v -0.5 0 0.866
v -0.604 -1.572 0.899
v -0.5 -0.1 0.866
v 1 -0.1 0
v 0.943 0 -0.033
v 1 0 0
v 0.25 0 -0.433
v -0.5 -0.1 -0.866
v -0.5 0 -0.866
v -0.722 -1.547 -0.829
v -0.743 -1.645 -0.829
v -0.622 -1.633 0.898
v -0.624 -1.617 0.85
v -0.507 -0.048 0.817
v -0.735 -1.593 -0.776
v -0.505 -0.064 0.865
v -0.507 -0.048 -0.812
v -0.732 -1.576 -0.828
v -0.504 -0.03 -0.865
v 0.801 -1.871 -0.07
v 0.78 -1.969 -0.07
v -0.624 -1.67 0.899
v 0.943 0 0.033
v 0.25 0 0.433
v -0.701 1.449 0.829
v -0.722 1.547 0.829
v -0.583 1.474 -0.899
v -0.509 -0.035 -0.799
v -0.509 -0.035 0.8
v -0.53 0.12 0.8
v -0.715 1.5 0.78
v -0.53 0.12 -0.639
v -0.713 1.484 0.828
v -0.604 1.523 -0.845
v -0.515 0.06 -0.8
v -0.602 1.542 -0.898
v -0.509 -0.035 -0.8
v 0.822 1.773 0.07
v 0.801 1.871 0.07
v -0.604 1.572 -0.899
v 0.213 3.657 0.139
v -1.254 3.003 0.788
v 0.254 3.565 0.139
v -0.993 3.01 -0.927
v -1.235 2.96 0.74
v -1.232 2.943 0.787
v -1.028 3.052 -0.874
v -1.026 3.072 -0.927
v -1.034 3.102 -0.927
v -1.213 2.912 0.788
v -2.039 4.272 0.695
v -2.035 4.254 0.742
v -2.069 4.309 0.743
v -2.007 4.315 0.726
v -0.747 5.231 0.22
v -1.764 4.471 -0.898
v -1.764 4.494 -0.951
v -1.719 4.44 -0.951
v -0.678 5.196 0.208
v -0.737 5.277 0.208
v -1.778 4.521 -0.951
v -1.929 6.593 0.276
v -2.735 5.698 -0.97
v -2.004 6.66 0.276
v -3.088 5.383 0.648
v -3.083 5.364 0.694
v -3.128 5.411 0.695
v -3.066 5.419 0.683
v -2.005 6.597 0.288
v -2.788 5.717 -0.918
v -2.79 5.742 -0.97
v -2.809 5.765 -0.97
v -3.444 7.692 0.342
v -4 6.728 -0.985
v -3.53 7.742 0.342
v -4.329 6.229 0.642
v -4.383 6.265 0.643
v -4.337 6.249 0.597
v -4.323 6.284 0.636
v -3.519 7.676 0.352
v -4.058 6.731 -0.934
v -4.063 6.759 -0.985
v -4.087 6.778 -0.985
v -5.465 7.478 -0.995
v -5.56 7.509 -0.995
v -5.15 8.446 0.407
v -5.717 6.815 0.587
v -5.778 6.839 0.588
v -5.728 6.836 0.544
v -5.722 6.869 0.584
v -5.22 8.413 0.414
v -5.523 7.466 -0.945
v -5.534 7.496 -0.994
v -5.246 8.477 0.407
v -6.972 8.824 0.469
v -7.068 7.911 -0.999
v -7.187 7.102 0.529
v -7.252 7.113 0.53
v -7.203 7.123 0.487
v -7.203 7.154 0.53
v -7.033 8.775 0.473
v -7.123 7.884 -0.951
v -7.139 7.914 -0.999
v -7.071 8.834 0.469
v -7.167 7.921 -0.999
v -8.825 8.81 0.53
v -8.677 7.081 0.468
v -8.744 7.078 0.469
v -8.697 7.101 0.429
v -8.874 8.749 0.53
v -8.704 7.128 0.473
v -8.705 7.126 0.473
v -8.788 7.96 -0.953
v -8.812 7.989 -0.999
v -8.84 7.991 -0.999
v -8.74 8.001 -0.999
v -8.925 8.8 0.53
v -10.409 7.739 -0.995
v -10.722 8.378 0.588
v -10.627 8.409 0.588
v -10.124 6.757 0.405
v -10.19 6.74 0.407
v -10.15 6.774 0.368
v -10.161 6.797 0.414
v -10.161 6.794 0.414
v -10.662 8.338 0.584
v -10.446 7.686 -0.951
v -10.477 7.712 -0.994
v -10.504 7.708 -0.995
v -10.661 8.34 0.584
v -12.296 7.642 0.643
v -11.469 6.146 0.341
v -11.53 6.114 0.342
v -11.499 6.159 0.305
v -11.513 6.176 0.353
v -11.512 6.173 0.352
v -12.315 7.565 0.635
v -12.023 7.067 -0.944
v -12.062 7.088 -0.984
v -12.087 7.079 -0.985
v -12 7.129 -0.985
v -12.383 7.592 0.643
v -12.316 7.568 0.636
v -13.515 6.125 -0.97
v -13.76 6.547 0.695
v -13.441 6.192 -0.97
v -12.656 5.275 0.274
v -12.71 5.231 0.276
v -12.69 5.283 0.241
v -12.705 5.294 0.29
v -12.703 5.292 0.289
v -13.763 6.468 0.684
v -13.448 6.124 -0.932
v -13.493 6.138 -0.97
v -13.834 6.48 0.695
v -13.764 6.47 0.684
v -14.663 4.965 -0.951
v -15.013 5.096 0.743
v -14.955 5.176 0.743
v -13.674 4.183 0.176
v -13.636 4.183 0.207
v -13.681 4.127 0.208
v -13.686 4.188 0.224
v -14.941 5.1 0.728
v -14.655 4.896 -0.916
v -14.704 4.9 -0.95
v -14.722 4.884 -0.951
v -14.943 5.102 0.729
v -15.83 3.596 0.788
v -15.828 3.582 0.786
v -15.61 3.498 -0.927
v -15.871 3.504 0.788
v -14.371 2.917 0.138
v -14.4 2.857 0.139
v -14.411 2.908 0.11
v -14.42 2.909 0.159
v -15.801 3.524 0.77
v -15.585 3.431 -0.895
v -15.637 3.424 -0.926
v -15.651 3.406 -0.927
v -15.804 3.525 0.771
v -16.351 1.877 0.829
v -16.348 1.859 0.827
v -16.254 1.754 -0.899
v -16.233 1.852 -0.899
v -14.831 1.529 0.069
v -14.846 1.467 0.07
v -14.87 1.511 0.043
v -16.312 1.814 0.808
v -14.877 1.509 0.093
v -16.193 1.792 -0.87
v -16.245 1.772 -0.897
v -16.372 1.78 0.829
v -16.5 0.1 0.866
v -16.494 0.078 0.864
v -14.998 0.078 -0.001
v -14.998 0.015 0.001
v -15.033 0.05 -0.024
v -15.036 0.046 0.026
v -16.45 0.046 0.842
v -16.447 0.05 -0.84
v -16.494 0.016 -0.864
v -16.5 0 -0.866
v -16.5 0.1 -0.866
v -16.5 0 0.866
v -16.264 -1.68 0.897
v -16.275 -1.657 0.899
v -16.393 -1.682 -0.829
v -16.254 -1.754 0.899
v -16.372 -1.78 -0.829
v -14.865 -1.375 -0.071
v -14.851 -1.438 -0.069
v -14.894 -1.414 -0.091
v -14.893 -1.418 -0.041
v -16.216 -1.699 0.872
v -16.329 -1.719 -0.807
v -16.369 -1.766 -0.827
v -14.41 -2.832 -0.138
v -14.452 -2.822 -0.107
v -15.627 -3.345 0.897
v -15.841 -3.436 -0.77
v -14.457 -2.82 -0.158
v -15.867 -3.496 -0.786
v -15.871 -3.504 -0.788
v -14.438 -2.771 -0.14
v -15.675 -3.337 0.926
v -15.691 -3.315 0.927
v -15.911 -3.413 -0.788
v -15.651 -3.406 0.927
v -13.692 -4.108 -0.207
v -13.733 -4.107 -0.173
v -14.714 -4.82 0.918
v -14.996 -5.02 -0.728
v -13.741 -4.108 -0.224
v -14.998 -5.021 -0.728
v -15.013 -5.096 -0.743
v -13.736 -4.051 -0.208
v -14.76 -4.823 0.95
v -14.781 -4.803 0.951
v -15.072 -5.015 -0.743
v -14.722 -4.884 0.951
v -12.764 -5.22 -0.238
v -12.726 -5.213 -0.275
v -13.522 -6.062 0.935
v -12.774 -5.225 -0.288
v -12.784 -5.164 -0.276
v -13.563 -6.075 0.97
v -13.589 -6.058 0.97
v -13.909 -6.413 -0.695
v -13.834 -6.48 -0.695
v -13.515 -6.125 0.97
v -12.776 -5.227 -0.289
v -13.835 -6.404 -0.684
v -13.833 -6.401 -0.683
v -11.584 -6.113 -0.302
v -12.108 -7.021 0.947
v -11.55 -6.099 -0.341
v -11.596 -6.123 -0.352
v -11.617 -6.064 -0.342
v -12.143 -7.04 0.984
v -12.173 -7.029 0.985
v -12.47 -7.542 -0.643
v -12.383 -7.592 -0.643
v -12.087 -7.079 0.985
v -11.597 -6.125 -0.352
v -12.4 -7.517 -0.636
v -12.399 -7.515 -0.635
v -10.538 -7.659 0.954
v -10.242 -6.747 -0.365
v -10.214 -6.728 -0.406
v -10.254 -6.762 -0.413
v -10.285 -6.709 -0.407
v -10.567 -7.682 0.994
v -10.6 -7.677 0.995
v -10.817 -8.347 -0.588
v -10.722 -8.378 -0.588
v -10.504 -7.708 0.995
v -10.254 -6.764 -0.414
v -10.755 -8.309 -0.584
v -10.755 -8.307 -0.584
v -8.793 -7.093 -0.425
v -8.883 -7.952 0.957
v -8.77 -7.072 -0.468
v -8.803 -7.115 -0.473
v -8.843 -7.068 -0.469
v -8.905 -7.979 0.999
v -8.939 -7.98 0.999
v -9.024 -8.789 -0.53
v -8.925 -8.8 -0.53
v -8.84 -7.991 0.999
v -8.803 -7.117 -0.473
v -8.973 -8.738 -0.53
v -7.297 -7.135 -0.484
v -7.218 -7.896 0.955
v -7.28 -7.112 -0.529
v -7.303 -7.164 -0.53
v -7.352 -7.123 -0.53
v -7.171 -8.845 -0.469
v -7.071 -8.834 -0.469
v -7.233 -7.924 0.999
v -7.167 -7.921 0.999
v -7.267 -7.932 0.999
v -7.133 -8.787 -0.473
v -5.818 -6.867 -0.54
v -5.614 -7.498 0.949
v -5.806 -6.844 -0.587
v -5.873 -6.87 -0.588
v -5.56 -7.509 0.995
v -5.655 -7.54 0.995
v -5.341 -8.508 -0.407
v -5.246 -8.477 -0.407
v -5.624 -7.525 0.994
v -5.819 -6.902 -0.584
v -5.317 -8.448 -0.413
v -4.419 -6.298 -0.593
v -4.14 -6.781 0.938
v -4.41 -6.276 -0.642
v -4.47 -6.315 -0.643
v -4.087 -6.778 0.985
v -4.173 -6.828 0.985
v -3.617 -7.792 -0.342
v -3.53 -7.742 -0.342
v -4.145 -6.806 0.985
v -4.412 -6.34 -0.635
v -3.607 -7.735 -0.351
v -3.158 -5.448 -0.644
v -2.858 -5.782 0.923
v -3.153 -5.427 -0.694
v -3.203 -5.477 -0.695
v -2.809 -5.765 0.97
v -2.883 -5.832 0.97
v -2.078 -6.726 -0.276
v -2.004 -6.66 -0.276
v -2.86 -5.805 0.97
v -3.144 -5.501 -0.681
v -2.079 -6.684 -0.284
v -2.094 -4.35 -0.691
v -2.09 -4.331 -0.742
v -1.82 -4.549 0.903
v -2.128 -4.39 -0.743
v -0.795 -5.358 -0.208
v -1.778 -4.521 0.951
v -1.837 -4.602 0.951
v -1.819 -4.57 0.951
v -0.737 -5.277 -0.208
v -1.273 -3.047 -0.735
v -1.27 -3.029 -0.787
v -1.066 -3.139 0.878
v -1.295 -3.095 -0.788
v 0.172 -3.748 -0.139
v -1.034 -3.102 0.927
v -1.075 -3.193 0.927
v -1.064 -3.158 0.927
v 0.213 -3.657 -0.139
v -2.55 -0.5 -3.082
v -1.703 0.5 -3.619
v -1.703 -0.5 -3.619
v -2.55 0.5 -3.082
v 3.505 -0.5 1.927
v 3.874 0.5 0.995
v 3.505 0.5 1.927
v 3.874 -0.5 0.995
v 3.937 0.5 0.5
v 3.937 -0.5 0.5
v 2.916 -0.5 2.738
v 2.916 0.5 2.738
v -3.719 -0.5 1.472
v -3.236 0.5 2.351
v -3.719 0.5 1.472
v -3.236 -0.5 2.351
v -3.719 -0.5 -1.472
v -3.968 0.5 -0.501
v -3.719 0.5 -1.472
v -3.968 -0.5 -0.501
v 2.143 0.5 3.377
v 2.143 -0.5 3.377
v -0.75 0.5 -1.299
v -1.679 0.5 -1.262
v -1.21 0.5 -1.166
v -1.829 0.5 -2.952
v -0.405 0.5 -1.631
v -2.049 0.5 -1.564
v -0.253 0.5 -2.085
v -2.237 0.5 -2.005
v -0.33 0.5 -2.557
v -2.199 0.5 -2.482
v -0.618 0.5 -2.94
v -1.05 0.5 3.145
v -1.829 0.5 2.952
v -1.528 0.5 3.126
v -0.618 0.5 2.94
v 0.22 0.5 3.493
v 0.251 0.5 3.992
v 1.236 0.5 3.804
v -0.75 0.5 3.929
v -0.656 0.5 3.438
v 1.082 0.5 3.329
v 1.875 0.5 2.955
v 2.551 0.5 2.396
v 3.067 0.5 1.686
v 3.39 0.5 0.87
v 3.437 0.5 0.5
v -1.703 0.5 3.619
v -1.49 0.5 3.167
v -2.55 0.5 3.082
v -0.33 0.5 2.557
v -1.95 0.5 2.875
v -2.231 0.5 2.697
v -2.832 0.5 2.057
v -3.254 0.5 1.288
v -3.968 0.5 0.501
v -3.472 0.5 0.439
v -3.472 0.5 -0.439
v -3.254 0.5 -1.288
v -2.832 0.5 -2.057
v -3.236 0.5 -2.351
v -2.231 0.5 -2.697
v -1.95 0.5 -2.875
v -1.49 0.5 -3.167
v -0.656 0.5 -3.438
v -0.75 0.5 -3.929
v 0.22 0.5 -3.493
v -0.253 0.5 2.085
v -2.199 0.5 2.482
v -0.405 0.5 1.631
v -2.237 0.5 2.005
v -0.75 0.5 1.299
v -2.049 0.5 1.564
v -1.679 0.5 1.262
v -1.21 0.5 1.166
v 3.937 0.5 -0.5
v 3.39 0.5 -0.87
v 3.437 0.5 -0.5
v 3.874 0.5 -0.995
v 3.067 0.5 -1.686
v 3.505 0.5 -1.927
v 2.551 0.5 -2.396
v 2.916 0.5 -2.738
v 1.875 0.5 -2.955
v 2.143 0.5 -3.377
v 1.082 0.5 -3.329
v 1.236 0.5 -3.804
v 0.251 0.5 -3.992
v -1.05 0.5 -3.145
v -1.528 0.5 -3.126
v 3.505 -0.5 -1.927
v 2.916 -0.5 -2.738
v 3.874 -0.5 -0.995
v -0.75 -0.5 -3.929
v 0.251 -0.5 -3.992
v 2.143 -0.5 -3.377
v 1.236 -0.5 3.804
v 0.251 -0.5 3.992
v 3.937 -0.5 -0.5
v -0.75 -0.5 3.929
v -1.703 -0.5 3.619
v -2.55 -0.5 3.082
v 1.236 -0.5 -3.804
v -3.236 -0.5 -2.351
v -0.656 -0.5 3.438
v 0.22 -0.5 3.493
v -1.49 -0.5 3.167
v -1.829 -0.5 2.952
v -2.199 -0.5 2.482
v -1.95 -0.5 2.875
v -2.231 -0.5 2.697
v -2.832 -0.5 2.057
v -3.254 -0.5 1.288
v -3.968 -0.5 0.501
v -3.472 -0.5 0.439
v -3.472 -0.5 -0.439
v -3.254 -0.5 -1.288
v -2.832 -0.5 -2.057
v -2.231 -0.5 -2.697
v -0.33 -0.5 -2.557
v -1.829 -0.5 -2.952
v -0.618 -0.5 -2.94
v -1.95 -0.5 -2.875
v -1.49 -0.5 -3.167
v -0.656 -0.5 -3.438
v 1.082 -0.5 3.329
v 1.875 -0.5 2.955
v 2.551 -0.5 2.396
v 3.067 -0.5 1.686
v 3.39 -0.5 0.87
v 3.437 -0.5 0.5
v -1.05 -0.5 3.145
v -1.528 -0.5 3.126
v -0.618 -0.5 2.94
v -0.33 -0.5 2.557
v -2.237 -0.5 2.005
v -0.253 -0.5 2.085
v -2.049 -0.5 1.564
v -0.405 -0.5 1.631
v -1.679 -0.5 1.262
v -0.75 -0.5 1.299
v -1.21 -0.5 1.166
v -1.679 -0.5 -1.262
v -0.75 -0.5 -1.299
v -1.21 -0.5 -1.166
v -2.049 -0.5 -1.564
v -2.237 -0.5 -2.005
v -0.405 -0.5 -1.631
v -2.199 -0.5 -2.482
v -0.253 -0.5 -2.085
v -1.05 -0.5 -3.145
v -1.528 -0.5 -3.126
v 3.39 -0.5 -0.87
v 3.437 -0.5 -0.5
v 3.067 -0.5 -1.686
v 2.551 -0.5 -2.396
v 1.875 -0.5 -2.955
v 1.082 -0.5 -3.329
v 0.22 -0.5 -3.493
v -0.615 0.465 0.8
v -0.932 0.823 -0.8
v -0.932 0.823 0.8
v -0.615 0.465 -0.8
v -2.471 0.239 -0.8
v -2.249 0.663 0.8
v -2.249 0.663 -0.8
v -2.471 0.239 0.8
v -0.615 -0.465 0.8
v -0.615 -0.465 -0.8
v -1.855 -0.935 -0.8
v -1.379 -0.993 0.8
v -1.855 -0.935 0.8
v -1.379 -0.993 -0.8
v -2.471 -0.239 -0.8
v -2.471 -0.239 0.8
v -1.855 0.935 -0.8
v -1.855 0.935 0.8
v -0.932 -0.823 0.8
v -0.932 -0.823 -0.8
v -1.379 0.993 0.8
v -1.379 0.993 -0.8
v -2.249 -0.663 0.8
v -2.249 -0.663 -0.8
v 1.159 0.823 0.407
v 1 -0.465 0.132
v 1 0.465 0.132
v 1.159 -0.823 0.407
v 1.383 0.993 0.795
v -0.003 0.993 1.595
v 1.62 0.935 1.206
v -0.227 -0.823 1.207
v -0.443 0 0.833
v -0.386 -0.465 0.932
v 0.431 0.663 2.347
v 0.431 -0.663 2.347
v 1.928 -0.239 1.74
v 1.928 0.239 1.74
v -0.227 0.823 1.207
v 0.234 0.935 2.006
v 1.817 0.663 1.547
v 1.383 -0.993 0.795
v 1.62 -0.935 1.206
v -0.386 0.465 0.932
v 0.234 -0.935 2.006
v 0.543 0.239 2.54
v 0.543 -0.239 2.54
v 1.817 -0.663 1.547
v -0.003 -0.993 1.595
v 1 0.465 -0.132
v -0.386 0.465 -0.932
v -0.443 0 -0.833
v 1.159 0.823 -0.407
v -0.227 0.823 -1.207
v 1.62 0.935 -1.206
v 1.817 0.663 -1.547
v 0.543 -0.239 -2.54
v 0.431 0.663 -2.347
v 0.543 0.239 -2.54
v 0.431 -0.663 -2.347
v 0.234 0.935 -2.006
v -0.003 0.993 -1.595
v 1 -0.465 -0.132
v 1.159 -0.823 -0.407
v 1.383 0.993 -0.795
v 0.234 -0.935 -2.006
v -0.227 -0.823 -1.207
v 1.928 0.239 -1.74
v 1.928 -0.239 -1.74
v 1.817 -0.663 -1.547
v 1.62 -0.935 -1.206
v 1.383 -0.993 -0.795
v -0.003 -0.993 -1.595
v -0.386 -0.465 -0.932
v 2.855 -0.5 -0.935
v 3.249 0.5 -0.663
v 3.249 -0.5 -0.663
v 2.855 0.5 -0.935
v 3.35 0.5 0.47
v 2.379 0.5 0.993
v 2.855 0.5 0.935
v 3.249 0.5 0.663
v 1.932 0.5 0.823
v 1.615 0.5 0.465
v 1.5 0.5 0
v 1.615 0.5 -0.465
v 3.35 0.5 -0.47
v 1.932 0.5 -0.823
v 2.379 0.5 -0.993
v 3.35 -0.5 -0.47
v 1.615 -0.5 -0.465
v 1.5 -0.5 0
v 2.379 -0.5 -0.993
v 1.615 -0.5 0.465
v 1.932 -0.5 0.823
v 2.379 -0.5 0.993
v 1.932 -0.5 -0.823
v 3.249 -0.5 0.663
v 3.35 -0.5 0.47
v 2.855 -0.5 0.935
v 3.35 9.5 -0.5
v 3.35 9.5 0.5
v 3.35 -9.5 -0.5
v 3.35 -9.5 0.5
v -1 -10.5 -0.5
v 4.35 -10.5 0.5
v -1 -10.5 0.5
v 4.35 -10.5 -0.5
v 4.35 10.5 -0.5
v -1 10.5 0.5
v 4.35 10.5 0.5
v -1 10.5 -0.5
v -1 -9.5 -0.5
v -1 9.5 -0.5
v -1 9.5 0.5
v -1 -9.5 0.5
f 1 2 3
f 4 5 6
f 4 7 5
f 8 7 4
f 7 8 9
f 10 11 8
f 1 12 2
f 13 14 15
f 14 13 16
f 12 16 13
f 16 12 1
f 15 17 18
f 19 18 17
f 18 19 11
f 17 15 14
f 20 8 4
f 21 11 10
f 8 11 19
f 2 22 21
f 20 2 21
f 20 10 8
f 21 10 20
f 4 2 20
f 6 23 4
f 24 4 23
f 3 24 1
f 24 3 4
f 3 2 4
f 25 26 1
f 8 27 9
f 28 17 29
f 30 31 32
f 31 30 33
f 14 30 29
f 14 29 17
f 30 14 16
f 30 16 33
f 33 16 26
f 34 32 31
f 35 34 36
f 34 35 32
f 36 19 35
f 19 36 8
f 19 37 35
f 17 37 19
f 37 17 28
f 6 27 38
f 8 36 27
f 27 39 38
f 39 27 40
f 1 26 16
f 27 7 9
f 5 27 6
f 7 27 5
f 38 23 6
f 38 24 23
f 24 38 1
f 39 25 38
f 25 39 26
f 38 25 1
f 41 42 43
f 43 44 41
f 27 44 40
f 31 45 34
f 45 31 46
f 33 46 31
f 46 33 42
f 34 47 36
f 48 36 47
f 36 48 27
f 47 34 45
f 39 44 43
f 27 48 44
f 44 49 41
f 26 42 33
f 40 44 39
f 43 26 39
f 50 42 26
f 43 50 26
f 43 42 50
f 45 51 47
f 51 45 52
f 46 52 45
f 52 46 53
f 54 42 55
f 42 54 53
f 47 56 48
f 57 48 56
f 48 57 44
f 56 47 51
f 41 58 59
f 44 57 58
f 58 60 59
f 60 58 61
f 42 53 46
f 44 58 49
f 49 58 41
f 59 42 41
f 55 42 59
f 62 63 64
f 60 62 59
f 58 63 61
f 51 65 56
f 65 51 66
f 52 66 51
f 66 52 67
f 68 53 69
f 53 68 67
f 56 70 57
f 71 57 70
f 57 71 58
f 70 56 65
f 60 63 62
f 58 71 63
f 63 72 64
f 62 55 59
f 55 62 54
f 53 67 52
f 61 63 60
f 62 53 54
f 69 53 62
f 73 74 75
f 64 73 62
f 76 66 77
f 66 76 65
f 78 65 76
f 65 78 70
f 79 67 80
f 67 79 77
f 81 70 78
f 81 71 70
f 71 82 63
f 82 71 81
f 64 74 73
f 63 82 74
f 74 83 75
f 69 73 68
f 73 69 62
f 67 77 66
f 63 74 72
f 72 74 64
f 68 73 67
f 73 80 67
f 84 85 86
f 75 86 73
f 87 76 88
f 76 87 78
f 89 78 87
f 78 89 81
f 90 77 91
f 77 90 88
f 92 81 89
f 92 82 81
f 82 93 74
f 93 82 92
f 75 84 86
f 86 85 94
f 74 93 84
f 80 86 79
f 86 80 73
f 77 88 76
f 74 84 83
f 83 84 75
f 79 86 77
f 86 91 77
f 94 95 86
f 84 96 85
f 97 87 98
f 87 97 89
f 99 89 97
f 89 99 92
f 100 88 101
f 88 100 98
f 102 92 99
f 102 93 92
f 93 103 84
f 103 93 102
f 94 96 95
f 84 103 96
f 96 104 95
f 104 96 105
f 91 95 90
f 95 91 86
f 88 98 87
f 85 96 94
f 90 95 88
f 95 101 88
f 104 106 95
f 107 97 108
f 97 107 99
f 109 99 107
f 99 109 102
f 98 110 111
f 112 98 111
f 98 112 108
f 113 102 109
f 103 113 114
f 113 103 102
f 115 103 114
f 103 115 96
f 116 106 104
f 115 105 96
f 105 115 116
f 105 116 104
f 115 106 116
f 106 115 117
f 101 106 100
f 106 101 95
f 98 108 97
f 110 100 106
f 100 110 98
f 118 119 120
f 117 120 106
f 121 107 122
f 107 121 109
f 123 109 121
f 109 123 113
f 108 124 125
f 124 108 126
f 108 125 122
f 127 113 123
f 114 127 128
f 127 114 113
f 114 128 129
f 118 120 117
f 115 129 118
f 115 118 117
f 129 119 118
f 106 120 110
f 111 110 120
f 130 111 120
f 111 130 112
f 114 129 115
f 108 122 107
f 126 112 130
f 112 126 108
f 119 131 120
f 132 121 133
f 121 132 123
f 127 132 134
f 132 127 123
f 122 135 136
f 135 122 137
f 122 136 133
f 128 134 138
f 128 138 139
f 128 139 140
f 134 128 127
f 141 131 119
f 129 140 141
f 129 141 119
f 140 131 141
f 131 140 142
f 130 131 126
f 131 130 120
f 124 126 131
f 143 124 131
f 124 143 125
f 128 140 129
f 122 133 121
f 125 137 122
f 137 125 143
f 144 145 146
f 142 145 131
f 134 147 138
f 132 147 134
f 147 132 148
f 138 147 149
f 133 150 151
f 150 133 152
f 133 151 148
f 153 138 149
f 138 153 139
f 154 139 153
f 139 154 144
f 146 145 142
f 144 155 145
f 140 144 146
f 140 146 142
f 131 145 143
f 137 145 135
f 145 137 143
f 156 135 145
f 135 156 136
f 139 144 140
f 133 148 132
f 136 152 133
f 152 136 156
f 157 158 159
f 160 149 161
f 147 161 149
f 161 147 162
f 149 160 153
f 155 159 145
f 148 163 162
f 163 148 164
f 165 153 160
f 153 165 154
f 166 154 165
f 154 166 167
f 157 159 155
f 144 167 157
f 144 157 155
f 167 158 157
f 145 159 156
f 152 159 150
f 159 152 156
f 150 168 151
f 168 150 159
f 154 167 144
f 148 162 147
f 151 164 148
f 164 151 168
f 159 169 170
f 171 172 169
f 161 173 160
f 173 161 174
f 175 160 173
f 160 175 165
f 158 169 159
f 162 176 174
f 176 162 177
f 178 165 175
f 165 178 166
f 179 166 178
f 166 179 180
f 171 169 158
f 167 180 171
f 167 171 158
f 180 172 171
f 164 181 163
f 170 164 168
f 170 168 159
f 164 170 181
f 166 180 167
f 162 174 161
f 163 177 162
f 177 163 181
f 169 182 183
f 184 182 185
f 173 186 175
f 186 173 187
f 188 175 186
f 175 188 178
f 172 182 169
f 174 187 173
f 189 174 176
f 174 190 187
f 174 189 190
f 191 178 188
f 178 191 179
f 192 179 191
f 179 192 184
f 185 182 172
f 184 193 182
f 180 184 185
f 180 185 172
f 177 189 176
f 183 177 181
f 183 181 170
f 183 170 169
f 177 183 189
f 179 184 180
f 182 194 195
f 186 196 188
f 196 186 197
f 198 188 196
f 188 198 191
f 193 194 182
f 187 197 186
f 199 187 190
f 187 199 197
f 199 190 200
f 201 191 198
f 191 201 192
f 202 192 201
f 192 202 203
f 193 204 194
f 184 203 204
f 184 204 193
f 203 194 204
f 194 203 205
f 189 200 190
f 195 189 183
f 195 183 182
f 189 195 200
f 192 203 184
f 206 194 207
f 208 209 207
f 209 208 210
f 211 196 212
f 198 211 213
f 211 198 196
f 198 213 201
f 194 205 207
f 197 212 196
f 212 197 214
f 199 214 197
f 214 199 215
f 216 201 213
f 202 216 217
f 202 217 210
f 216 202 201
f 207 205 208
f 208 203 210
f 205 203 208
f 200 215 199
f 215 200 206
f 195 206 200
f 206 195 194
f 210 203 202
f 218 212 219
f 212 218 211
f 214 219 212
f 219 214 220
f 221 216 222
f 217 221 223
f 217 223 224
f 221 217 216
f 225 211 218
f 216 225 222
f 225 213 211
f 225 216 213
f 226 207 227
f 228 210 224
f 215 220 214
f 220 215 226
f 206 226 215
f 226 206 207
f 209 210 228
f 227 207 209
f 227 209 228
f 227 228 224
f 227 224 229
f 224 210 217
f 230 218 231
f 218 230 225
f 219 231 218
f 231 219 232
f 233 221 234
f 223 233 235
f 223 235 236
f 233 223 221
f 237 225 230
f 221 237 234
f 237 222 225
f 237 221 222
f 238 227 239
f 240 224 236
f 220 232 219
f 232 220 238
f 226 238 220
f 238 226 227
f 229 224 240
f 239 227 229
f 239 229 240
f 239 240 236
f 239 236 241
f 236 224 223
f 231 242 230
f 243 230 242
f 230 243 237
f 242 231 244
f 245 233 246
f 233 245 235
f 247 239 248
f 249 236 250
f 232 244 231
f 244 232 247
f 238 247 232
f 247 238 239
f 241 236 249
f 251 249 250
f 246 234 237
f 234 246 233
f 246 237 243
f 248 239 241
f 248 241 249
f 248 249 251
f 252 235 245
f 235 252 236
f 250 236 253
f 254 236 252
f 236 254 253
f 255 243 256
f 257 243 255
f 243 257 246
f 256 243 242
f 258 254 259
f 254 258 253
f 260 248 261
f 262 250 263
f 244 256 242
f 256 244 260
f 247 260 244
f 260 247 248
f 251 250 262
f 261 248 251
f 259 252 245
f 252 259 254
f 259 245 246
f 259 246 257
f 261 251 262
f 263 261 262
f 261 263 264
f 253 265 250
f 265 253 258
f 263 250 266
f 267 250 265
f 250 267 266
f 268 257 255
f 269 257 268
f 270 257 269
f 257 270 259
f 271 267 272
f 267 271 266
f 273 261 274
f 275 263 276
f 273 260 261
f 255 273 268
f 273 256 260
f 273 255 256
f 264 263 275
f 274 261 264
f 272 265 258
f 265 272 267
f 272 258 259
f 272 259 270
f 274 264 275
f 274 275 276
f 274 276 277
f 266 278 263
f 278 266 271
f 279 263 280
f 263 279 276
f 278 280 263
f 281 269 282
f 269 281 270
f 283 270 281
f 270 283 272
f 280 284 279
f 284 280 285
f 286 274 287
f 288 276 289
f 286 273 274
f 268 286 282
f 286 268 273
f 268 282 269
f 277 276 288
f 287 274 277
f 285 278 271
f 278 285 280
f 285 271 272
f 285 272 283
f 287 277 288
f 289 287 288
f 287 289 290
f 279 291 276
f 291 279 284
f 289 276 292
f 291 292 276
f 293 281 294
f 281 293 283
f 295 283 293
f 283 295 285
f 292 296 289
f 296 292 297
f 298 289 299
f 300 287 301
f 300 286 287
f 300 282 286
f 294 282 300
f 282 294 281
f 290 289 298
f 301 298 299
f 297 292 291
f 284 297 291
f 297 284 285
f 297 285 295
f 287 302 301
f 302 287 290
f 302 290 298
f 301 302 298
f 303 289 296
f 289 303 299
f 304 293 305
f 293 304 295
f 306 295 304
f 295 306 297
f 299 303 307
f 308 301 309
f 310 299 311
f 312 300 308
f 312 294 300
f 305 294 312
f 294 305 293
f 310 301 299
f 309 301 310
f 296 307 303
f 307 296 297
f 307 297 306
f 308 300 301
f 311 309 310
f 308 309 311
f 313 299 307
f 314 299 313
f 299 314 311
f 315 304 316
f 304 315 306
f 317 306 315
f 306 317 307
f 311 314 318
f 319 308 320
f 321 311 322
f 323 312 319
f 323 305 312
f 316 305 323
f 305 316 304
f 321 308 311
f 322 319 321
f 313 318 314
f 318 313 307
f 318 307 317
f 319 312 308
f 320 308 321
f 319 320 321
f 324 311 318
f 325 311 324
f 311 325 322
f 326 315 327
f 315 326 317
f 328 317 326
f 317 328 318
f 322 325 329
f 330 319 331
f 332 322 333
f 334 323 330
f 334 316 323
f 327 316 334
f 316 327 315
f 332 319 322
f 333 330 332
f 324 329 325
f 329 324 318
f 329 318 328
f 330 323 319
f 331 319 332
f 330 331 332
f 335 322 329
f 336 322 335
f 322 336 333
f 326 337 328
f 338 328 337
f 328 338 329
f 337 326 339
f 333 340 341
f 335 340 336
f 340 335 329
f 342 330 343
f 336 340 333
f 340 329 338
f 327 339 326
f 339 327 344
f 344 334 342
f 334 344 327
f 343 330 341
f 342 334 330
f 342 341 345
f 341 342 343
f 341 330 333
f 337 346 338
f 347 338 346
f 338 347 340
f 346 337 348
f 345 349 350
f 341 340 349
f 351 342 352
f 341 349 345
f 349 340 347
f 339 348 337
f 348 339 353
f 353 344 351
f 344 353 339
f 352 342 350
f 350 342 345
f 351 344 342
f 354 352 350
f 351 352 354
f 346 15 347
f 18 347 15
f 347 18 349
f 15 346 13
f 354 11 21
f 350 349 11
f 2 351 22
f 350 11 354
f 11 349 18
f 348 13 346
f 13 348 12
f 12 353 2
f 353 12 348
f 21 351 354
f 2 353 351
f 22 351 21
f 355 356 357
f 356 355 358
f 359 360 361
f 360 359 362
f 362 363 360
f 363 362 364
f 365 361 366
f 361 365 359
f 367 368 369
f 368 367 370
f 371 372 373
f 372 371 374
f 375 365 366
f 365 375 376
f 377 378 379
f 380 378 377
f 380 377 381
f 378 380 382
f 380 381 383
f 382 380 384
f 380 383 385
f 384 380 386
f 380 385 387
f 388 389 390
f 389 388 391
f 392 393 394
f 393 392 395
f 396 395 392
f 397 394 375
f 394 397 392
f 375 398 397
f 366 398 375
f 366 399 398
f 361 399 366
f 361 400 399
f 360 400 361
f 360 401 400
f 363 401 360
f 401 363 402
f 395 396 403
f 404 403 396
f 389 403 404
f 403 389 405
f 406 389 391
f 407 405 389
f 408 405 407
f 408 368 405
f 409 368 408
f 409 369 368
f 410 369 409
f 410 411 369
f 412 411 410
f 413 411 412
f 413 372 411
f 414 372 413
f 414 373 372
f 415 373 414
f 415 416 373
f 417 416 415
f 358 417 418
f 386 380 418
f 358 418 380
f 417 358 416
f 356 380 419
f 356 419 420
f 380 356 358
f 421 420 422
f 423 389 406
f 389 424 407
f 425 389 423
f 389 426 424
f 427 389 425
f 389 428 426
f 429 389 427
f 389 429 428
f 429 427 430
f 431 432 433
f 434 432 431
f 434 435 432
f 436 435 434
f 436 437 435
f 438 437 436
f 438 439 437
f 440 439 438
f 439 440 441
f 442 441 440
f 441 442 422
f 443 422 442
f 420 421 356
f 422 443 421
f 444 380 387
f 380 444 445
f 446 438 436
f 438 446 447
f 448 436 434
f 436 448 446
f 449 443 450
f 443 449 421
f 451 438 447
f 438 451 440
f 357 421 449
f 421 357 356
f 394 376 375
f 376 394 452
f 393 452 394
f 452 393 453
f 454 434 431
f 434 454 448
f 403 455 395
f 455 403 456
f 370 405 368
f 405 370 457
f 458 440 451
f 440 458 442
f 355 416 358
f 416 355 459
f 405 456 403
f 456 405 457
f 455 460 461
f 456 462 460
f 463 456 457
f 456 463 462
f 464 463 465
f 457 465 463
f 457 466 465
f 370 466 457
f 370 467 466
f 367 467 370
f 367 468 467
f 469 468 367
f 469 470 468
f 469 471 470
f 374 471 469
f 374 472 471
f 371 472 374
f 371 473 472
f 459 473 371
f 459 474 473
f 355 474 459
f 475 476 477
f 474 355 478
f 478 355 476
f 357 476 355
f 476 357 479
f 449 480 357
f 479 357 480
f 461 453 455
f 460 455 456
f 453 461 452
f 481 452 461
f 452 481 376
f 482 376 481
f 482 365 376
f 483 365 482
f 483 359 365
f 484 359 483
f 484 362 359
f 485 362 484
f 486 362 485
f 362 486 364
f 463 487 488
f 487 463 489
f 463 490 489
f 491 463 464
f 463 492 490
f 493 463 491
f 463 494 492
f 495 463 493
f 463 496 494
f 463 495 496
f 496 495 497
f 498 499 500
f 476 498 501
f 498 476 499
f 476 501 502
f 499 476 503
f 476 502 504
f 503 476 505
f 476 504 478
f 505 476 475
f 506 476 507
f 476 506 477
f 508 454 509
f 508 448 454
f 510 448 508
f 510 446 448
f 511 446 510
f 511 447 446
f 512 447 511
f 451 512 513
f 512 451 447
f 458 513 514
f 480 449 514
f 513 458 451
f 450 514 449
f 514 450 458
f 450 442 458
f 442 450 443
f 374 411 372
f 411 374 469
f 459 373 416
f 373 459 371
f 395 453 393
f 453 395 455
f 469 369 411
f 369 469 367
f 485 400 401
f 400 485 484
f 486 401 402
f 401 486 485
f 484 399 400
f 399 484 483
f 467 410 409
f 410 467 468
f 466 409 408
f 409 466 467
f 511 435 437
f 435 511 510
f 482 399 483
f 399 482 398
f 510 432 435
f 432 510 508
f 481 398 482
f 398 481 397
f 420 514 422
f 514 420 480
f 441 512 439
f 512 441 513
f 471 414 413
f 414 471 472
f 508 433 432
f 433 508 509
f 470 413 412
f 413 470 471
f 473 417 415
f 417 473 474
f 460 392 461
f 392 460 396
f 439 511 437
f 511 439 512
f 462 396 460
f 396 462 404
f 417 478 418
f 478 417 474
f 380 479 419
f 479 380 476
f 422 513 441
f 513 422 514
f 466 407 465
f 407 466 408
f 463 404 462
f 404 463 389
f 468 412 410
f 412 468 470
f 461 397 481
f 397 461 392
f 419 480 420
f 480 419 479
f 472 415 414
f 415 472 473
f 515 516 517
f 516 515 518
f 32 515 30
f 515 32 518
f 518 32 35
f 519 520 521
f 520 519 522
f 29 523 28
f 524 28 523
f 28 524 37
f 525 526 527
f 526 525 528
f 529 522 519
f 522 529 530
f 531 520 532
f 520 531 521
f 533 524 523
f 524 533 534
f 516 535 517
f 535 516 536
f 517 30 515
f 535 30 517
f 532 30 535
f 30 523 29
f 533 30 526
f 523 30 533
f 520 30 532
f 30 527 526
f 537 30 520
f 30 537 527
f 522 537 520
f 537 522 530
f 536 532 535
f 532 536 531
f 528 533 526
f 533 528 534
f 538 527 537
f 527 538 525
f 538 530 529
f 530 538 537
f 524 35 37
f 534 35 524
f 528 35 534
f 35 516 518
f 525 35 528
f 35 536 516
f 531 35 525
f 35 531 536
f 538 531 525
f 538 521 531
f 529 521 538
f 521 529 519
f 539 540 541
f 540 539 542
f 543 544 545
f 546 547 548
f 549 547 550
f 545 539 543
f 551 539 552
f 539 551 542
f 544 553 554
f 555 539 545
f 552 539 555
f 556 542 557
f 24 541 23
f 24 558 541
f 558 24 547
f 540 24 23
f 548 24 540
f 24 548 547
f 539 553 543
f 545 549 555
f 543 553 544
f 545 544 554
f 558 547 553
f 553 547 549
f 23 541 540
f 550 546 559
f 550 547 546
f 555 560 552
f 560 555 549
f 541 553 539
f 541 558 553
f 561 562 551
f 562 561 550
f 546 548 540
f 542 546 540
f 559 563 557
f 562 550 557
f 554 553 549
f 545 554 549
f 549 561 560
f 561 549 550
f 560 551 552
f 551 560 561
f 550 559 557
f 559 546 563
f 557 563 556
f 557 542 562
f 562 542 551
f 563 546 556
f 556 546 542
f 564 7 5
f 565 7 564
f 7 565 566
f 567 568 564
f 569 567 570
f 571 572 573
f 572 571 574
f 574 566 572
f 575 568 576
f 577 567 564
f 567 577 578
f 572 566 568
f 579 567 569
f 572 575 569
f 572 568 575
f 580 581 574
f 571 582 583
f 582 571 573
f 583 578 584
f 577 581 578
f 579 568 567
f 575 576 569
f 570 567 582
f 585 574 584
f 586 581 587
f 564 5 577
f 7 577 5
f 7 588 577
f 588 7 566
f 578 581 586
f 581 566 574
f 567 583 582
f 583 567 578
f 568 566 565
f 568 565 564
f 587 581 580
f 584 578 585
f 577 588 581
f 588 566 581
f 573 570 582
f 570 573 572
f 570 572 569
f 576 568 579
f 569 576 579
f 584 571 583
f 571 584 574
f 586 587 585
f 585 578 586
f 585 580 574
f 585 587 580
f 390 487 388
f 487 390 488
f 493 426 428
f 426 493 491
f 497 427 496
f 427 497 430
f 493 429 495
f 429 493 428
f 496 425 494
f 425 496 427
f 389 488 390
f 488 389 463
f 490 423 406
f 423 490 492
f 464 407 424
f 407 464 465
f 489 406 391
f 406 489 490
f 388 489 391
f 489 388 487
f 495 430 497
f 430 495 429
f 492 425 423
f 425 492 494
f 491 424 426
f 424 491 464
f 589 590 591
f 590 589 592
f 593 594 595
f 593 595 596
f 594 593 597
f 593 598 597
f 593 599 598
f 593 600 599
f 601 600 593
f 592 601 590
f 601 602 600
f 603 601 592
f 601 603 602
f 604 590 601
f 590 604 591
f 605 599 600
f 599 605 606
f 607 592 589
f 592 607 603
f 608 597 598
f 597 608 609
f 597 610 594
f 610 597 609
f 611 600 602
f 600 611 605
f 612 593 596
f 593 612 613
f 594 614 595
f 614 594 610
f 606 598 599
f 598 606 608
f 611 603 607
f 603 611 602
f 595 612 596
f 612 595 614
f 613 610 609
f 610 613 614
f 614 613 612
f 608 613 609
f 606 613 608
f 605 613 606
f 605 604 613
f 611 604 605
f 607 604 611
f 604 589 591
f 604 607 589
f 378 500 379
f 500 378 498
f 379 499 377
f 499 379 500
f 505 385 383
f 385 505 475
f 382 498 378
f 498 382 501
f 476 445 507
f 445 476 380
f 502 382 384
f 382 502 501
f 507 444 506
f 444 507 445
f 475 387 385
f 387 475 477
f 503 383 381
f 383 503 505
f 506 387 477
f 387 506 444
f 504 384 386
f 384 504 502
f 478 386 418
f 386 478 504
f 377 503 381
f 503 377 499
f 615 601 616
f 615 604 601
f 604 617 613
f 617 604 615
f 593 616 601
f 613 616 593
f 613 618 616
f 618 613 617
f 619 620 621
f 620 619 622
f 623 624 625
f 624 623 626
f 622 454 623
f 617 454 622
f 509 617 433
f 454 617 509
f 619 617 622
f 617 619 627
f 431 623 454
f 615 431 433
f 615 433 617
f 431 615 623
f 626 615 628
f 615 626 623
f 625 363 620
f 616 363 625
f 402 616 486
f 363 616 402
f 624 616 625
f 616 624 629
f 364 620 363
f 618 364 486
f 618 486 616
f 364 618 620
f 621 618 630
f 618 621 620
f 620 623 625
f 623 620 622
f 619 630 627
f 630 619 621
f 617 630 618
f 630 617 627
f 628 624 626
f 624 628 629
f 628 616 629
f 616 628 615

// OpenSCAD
module profile(){linear_extrude (0.1)circle(1,$fn=3);}


module ring(){
for (i=[0:12:360]){
ii=i-(12);
hull(){
rotate([0,0,i])translate([8,0,0]) rotate([90,0,0])rotate([0,0,i/3])profile();
rotate([0,0,ii])translate([8,0,0]) rotate([90,0,0])rotate([0,0,ii/3])profile();}


}}

rotate([0,$t*-360])translate([-8,0,0])rotate([0,0,$t*360*3])ring();


rotate([0,0,0])
translate([-1.5,0,0])rotate([0,0,$t*360*-3])cylinder(1.6,center=true,$fn=13);
rotate([0,120,0])
translate([-1.5,0,0])rotate([0,0,$t*360*-3])cylinder(1.6,center=true,$fn=13);
rotate([0,120*2,0])
translate([-1.5,0,0])rotate([0,0,$t*360*-3])cylinder(1.6,center=true,$fn=13);



rotate([0,60,0])
translate([-2.5,0,0])
rotate([90,0,0])rotate([0,0,$t*360*-3])cylinder(1,1,1,center=true,$fn=13);
rotate([0,60+120,0])
translate([-2.5,0,0])
rotate([90,0,0])rotate([0,0,$t*360*-3])cylinder(1,1,1,center=true,$fn=13);
rotate([0,60+240,0])
translate([-2.5,0,0])
rotate([90,0,0])rotate([0,0,$t*360*-3])cylinder(1,1,1,center=true,$fn=13);


rotate([90,0,0])rotate([0,0,$t*360])
difference(){
cylinder(1,4,4,center=true,$fn=25);
cylinder(3,3.5,3.5,center=true,$fn=25);}


rotate([90,0,0])rotate([0,0,$t*360])
translate([3.85,0,0])cube([1,1,21],center=true);

rotate([90,0,0])rotate([0,0,$t*360])
translate([1.5,0,10])cube([5,1,1],center=true);
rotate([90,0,0])rotate([0,0,$t*360])
translate([1.5,0,-10])cube([5,1,1],center=true);
